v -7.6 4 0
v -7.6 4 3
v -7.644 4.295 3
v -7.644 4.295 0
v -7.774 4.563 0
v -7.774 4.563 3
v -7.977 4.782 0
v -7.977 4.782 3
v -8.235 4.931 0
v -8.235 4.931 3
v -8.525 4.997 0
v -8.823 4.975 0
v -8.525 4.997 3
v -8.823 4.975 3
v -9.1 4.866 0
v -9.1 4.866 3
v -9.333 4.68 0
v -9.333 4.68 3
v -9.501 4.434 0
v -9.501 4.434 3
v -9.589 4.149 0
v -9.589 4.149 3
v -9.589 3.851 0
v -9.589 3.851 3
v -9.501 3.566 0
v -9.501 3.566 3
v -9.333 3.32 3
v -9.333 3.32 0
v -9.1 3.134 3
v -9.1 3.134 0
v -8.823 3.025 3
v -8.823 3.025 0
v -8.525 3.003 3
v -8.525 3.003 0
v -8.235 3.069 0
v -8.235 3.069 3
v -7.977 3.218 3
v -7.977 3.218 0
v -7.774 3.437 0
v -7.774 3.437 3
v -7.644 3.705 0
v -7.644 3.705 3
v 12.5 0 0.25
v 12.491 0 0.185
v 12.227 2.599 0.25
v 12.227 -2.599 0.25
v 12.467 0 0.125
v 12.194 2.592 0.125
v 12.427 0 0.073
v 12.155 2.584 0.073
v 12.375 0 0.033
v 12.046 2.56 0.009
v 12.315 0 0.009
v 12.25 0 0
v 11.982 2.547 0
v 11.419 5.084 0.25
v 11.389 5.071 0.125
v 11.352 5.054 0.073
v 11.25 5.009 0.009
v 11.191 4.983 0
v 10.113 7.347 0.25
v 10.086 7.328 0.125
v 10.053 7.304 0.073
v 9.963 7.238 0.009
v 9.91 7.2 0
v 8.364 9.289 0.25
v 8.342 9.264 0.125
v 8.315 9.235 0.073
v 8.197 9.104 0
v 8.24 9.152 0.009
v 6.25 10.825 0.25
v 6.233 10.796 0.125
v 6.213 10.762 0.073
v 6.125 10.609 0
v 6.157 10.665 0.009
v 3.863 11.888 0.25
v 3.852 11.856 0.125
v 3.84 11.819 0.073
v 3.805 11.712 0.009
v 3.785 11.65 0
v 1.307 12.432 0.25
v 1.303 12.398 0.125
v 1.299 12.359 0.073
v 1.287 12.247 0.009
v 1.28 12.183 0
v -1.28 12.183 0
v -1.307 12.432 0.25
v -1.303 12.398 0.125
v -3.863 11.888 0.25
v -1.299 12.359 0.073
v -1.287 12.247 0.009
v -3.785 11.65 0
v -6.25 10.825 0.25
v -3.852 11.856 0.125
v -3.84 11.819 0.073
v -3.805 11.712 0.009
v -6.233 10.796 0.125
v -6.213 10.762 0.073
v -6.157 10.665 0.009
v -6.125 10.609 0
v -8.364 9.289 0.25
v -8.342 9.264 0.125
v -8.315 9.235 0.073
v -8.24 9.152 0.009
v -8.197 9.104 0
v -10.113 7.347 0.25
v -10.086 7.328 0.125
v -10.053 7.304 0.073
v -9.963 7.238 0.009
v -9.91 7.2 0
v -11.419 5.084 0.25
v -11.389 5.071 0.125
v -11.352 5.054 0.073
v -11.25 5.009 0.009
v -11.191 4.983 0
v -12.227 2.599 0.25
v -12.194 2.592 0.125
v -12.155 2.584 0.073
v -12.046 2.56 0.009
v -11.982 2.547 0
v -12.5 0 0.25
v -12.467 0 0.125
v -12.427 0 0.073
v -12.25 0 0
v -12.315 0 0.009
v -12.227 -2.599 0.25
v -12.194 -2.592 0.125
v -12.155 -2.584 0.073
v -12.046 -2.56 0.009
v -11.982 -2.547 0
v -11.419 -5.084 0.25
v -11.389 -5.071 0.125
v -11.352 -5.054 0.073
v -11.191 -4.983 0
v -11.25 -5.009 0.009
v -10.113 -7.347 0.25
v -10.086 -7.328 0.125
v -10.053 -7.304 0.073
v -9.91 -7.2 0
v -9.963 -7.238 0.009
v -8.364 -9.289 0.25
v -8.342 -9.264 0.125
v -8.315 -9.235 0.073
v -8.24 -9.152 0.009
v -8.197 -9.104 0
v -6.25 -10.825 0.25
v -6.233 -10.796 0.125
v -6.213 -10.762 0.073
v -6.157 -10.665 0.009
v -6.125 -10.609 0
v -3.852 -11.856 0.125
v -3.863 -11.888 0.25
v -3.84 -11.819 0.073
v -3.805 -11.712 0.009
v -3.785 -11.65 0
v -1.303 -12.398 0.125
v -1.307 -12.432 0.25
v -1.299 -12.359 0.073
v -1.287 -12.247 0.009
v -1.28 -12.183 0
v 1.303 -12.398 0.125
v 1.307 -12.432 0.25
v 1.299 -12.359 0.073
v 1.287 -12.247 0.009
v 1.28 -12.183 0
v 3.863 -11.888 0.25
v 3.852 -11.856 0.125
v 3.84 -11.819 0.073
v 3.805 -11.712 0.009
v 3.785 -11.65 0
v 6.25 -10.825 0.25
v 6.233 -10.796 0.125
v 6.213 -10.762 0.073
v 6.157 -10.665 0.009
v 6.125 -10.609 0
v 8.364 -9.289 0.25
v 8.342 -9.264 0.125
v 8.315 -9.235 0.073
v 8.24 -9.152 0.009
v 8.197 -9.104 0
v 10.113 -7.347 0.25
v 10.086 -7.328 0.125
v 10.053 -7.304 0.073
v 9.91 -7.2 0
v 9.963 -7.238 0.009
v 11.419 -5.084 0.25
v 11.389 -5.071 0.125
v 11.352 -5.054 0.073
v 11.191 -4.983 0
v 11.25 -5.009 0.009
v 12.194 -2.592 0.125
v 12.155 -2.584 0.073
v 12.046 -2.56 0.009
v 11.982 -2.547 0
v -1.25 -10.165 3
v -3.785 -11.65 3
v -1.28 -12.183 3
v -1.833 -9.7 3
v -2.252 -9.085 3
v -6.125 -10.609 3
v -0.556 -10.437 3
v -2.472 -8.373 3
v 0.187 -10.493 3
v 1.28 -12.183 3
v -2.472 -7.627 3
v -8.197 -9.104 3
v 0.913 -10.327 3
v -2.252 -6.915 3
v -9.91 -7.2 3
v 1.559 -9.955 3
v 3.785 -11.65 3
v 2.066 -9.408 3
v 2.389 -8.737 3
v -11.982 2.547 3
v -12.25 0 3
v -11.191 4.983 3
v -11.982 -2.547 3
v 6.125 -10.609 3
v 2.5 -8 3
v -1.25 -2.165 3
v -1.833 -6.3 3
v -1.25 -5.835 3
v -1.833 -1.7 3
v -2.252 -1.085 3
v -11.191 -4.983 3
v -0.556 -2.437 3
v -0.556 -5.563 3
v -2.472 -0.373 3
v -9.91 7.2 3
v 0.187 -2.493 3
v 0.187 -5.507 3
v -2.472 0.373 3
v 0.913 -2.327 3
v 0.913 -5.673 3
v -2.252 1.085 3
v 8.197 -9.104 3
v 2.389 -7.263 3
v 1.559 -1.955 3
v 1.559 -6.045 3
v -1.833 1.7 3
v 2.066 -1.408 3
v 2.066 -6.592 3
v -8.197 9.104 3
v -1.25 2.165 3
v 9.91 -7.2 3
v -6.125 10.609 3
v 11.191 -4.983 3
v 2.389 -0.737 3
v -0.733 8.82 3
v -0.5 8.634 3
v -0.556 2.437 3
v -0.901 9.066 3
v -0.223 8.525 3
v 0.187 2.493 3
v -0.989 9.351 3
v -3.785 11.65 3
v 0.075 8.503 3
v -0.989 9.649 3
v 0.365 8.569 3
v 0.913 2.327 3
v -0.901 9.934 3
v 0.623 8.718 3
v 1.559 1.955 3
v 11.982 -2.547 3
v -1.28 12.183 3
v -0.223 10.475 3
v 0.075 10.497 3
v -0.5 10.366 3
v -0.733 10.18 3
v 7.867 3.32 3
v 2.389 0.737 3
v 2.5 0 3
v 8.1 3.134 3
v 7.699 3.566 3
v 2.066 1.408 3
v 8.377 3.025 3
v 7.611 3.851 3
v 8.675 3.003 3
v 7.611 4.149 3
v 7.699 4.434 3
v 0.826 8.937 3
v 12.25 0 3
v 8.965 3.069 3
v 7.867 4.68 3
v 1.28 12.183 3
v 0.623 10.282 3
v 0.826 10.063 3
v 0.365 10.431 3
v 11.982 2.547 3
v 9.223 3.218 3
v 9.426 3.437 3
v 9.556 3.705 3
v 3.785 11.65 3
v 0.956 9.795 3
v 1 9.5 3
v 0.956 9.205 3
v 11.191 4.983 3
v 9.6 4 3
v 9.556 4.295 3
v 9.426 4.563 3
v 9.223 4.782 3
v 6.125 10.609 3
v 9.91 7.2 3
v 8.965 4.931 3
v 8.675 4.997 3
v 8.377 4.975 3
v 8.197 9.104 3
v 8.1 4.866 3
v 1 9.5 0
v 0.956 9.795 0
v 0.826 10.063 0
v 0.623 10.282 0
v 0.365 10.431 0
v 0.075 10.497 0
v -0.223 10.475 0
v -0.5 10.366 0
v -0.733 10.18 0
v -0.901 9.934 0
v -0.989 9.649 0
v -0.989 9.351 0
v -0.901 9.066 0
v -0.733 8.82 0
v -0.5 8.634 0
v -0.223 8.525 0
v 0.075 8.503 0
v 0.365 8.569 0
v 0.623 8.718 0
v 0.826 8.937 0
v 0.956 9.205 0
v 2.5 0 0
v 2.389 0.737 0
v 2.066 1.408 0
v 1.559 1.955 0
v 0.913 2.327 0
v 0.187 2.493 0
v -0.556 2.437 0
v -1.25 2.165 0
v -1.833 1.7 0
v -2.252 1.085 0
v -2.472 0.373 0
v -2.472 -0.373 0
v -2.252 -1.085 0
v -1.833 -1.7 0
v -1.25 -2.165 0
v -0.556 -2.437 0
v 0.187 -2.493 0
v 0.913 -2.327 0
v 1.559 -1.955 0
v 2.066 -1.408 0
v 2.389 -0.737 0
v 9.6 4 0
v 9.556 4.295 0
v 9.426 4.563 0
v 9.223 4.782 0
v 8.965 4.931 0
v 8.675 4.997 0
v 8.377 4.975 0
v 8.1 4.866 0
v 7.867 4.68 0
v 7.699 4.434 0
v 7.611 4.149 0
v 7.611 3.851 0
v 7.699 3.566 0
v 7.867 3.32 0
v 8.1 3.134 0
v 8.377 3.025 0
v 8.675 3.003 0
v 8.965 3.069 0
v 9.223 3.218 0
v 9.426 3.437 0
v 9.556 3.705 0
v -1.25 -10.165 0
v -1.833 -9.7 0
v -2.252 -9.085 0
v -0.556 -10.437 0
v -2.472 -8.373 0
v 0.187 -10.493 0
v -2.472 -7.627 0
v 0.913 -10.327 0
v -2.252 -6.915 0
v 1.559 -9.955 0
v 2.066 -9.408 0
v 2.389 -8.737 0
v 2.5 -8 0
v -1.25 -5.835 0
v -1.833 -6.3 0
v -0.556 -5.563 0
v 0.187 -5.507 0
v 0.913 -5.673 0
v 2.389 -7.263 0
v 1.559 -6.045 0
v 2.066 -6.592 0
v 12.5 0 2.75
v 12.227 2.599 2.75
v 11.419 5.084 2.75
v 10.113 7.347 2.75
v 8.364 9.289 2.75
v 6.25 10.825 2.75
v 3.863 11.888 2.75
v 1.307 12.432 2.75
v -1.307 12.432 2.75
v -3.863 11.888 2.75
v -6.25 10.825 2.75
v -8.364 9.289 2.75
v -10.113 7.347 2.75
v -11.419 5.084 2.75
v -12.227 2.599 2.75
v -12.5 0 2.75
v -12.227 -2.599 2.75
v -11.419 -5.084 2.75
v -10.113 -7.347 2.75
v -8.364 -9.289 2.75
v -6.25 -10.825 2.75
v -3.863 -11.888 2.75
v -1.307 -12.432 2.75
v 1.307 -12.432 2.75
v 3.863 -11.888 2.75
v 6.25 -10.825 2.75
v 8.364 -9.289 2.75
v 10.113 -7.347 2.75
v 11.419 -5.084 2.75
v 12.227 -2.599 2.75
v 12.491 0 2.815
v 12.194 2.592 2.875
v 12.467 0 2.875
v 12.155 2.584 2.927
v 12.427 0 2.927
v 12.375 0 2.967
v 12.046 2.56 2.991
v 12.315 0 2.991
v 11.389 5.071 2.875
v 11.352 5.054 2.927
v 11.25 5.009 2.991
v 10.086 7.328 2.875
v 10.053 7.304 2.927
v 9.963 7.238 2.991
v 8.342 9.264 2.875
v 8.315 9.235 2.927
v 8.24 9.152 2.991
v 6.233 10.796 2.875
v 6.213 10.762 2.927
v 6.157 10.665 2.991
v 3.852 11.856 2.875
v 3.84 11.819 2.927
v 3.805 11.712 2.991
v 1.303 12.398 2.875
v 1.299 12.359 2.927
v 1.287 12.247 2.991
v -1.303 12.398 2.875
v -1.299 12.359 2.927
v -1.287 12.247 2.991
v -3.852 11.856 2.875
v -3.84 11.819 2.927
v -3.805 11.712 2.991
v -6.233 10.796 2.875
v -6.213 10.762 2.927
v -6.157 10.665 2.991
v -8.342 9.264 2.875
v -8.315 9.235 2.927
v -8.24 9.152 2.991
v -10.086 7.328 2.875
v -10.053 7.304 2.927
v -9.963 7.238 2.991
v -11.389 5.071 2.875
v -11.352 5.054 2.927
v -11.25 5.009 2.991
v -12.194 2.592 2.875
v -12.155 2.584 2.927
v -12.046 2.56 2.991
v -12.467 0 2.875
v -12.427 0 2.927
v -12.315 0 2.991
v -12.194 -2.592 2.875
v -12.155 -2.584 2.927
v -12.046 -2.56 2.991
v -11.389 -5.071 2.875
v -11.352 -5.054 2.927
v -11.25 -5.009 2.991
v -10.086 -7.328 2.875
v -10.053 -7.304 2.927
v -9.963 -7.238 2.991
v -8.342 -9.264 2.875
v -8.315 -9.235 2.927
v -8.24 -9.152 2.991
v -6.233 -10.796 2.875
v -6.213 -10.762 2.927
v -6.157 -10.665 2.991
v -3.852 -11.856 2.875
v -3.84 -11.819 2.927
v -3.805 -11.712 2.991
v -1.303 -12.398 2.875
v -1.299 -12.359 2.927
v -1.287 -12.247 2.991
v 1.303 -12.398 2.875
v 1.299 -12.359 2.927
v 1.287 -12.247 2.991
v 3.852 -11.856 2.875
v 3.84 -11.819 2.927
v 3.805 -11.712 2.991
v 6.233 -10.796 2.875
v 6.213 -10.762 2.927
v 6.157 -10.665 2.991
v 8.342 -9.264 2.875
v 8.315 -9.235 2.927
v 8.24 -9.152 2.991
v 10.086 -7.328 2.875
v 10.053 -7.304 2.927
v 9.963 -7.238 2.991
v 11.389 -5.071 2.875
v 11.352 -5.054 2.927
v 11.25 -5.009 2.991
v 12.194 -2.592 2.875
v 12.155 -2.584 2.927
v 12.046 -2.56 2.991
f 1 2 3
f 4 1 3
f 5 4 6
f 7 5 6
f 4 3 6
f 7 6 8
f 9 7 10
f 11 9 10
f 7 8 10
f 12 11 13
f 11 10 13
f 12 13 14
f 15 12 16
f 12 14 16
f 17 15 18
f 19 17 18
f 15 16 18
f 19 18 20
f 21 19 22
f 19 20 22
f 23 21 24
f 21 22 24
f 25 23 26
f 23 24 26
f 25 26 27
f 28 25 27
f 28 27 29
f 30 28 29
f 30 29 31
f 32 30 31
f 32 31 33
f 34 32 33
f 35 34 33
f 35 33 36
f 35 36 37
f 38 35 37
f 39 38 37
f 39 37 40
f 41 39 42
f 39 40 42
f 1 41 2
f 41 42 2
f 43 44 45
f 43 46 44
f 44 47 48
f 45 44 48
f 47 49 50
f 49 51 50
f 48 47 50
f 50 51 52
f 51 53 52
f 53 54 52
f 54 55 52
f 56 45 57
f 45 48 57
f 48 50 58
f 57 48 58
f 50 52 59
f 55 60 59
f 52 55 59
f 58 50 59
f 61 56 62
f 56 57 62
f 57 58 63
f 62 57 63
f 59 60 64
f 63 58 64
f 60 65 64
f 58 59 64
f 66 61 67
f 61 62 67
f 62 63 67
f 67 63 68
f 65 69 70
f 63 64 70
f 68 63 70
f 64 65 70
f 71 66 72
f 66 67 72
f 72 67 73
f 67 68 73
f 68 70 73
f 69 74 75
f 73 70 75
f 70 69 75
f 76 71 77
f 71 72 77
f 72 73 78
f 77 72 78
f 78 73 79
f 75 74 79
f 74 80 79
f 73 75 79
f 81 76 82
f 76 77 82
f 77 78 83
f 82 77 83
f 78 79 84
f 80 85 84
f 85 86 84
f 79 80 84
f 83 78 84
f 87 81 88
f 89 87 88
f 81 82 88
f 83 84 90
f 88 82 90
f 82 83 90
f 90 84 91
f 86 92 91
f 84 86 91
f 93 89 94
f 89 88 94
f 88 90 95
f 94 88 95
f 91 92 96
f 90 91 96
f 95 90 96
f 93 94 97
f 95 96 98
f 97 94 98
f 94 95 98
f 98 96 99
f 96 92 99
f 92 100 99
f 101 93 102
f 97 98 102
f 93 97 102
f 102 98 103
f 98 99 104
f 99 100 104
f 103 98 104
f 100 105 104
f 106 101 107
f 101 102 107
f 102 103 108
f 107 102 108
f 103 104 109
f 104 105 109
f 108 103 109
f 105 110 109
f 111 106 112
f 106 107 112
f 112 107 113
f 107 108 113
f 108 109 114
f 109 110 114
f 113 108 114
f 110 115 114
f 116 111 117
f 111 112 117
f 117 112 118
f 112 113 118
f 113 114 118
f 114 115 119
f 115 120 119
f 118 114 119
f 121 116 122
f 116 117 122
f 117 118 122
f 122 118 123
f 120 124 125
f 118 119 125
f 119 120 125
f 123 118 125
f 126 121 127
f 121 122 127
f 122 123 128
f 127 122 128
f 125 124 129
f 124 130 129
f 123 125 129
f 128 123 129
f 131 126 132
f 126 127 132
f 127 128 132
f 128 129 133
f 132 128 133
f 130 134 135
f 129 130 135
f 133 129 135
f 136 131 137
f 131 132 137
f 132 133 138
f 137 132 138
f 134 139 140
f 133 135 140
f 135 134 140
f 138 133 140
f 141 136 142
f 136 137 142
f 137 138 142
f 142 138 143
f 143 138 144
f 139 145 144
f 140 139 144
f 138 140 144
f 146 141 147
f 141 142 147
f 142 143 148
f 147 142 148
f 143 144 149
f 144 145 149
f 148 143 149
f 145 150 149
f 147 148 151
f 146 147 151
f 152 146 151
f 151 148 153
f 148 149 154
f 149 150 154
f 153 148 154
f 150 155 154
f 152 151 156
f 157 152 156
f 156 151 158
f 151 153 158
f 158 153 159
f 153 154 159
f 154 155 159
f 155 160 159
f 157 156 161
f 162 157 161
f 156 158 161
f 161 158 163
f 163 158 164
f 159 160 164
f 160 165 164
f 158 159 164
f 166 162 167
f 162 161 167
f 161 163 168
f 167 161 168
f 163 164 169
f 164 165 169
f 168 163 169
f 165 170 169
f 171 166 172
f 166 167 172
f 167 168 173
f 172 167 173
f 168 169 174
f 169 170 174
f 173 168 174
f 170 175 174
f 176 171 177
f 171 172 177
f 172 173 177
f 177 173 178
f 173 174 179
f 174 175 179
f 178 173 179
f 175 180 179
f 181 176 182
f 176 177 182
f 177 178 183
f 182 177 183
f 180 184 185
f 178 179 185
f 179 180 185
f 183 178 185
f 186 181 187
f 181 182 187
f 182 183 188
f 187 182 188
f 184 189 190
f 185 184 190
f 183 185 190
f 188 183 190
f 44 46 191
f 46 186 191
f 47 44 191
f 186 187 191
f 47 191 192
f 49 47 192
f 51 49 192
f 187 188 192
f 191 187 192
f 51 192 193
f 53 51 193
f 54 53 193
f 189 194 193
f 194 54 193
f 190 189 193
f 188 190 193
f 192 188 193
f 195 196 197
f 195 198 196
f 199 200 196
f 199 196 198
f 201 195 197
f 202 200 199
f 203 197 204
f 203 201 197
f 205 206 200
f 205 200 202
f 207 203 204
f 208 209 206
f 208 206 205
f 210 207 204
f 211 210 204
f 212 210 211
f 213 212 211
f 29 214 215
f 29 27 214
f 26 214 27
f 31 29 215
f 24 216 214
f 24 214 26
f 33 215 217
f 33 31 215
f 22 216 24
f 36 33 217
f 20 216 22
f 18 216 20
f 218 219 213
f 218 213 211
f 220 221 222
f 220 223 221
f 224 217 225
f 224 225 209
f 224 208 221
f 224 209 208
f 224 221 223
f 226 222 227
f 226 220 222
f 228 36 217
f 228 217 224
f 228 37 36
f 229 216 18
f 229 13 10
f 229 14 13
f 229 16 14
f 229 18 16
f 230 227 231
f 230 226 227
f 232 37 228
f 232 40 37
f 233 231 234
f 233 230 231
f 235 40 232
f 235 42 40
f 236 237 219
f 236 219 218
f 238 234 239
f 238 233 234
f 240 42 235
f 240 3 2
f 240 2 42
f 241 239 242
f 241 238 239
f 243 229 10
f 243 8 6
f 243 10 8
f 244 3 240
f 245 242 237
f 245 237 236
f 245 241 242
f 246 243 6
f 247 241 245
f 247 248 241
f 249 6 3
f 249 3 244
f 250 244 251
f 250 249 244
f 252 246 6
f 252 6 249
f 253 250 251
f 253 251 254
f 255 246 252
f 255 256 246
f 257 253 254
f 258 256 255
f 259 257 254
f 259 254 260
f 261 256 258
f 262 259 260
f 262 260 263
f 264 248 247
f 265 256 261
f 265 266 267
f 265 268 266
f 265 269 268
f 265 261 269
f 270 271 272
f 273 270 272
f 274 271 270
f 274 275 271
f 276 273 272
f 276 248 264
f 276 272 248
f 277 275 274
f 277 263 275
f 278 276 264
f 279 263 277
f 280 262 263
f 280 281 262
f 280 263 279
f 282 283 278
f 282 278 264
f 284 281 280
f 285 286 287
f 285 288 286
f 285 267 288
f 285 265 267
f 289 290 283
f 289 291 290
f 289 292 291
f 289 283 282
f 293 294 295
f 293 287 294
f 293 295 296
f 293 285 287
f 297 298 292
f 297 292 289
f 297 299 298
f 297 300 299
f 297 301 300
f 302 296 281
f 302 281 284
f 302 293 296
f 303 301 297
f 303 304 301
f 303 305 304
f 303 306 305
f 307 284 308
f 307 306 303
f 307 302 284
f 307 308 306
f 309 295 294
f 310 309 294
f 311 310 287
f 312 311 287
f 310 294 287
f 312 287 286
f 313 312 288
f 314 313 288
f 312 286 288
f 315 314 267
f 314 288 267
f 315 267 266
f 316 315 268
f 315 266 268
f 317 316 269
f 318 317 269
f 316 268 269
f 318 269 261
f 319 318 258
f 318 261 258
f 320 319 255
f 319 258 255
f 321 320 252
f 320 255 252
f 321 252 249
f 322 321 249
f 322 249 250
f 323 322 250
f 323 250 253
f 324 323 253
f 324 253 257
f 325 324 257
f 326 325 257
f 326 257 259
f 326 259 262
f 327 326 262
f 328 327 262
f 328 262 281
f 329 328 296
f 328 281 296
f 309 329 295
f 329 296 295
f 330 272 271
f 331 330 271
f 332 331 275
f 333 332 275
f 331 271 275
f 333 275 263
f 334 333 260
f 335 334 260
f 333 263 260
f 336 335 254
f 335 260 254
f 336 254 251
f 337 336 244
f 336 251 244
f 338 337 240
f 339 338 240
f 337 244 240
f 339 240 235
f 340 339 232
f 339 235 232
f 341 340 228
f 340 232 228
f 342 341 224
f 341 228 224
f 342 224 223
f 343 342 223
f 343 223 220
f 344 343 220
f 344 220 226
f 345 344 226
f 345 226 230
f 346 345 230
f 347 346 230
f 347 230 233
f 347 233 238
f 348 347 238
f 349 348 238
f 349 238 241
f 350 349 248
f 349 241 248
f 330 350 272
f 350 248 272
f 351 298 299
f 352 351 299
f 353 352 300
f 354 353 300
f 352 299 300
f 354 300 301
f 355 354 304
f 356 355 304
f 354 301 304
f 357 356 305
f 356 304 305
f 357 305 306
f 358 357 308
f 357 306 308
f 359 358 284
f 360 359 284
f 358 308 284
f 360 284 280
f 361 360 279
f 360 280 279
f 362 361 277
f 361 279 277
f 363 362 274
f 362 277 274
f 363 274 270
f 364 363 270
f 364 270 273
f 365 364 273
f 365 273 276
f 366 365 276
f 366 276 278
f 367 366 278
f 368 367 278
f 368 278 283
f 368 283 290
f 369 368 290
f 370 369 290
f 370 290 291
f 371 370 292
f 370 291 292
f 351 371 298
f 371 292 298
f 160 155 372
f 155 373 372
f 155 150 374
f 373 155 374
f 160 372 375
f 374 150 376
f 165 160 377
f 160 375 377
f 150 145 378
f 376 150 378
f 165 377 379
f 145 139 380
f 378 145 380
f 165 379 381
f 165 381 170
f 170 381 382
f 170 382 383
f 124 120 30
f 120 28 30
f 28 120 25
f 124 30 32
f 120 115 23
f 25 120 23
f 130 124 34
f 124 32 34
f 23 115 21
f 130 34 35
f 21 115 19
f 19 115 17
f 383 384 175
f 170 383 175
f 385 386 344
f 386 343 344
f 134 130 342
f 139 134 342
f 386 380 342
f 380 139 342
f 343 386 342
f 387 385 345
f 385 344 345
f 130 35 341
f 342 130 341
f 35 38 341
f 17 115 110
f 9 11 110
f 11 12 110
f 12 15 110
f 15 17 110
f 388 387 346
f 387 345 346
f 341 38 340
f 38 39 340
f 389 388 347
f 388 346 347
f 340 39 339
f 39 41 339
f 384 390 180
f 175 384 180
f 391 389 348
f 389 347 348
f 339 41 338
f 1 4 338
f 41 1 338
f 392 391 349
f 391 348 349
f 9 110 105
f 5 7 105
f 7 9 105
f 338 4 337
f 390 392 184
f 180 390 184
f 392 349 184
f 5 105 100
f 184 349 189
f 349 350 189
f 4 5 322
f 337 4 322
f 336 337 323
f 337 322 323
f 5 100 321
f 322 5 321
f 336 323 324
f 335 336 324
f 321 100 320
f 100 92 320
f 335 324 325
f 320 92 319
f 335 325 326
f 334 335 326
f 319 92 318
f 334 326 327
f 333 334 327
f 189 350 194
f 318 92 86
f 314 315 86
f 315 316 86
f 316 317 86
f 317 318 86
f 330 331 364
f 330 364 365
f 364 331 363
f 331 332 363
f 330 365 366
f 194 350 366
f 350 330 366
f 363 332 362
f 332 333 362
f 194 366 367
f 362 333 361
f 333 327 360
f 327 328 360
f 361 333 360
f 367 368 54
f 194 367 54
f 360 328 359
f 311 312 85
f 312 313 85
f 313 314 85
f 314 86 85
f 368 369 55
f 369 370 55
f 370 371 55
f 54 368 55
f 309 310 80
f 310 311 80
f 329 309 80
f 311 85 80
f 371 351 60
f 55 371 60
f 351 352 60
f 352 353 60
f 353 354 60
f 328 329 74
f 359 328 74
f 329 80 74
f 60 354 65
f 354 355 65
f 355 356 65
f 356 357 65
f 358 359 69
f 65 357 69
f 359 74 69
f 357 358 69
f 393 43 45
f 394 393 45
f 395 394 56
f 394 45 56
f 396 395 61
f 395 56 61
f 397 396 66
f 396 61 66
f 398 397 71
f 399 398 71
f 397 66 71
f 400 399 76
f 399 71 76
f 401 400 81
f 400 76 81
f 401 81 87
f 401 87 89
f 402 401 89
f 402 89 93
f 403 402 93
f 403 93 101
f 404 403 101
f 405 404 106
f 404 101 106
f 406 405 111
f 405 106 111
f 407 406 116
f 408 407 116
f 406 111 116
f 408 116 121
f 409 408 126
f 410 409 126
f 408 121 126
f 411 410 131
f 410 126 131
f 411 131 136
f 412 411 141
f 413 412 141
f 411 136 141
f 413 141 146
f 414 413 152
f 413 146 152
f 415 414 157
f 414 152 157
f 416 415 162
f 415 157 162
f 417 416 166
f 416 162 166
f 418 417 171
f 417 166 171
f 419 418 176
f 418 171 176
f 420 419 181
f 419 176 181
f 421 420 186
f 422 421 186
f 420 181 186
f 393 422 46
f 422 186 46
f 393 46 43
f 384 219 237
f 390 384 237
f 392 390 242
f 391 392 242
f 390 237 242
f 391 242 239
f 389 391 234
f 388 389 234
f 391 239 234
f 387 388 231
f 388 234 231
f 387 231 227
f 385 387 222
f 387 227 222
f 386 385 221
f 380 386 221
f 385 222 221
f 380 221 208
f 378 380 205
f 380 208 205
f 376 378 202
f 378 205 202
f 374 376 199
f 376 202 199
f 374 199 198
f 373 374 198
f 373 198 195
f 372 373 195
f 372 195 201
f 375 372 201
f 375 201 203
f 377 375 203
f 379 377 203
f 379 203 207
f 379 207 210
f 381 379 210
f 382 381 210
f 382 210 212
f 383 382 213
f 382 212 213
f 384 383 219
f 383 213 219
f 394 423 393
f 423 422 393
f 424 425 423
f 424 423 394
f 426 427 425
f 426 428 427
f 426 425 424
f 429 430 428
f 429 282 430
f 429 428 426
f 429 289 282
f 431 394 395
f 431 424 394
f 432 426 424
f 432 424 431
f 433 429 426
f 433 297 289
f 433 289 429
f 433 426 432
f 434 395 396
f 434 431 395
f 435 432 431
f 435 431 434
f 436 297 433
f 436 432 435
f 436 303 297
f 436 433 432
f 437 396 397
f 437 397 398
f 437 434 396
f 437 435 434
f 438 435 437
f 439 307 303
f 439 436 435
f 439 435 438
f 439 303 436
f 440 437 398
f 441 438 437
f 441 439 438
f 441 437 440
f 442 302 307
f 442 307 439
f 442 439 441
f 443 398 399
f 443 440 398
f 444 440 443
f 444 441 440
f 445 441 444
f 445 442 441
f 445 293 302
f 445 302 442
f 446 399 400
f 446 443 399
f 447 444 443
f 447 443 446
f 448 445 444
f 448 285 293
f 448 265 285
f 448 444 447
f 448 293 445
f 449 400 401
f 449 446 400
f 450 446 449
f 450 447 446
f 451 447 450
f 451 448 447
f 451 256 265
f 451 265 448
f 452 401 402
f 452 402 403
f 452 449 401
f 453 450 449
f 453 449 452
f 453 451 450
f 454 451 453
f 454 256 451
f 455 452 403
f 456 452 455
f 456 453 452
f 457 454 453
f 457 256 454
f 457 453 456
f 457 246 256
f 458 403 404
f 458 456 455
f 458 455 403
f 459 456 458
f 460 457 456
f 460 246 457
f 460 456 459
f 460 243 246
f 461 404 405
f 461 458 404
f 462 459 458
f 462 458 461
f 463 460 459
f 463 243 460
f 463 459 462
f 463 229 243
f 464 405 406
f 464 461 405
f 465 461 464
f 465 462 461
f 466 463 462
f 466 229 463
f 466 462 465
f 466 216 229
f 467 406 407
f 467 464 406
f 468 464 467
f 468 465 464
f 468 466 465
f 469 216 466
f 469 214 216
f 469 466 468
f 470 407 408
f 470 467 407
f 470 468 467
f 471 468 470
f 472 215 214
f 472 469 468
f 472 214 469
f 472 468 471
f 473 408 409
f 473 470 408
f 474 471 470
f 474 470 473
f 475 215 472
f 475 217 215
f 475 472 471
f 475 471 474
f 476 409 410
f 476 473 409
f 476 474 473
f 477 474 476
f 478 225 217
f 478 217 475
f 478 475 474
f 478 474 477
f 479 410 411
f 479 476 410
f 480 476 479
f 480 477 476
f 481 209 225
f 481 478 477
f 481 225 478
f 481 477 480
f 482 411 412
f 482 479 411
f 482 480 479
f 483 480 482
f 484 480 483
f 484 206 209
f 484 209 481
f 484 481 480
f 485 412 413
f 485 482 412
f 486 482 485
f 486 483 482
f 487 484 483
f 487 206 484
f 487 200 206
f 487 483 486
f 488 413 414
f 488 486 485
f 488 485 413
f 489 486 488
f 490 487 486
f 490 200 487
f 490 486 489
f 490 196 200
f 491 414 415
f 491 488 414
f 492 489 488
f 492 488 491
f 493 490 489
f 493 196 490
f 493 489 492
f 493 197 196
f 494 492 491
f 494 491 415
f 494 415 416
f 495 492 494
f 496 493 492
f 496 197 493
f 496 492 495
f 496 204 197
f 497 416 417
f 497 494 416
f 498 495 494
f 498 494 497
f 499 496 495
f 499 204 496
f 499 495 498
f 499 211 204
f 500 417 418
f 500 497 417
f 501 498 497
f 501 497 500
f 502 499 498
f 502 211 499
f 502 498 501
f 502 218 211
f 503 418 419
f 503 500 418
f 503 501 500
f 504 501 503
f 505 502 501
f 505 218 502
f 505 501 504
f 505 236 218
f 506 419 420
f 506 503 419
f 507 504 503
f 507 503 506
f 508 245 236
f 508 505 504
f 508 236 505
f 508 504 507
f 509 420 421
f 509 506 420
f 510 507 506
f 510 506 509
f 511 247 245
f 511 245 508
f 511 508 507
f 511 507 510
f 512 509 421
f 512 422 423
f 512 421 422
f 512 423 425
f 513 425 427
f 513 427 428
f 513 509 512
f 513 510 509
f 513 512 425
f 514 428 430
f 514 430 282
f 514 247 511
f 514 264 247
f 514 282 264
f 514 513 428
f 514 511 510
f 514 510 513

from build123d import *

# Parameters (mm, degrees)
SKETCH1_R           = 12.5
BOSS_EXTRUDE1_DEPTH = 3
SKETCH2_R           = 2.5
SKETCH2_R_2         = 1
CUT_EXTRUDE1_DEPTH  = 3
FILLET1_R           = 0.25


with BuildPart() as part:
    # Sketch1 → Boss-Extrude1 (new body)
    with BuildSketch(Plane.XY):
        Circle(SKETCH1_R)
    extrude(amount=BOSS_EXTRUDE1_DEPTH)

    # Sketch2 → Cut-Extrude1 (cut)
    with BuildSketch(Plane.XY.offset(3)):
        Circle(SKETCH2_R)
        with Locations((0, -8)):
            Circle(SKETCH2_R)
        with Locations((0, 9.5)):
            Circle(SKETCH2_R_2)
        with Locations((8.6, 4)):
            Circle(SKETCH2_R_2)
        with Locations((-8.6, 4)):
            Circle(SKETCH2_R_2)
    extrude(amount=-CUT_EXTRUDE1_DEPTH, mode=Mode.SUBTRACT)

    # Fillet1
    fillet1_edges = [part.edges().sort_by_distance(p)[0] for p in [
        (-12.5, 0, 0),
        (-12.5, 0, 3),
    ]]
    fillet(fillet1_edges, radius=FILLET1_R)


solid = part.part
